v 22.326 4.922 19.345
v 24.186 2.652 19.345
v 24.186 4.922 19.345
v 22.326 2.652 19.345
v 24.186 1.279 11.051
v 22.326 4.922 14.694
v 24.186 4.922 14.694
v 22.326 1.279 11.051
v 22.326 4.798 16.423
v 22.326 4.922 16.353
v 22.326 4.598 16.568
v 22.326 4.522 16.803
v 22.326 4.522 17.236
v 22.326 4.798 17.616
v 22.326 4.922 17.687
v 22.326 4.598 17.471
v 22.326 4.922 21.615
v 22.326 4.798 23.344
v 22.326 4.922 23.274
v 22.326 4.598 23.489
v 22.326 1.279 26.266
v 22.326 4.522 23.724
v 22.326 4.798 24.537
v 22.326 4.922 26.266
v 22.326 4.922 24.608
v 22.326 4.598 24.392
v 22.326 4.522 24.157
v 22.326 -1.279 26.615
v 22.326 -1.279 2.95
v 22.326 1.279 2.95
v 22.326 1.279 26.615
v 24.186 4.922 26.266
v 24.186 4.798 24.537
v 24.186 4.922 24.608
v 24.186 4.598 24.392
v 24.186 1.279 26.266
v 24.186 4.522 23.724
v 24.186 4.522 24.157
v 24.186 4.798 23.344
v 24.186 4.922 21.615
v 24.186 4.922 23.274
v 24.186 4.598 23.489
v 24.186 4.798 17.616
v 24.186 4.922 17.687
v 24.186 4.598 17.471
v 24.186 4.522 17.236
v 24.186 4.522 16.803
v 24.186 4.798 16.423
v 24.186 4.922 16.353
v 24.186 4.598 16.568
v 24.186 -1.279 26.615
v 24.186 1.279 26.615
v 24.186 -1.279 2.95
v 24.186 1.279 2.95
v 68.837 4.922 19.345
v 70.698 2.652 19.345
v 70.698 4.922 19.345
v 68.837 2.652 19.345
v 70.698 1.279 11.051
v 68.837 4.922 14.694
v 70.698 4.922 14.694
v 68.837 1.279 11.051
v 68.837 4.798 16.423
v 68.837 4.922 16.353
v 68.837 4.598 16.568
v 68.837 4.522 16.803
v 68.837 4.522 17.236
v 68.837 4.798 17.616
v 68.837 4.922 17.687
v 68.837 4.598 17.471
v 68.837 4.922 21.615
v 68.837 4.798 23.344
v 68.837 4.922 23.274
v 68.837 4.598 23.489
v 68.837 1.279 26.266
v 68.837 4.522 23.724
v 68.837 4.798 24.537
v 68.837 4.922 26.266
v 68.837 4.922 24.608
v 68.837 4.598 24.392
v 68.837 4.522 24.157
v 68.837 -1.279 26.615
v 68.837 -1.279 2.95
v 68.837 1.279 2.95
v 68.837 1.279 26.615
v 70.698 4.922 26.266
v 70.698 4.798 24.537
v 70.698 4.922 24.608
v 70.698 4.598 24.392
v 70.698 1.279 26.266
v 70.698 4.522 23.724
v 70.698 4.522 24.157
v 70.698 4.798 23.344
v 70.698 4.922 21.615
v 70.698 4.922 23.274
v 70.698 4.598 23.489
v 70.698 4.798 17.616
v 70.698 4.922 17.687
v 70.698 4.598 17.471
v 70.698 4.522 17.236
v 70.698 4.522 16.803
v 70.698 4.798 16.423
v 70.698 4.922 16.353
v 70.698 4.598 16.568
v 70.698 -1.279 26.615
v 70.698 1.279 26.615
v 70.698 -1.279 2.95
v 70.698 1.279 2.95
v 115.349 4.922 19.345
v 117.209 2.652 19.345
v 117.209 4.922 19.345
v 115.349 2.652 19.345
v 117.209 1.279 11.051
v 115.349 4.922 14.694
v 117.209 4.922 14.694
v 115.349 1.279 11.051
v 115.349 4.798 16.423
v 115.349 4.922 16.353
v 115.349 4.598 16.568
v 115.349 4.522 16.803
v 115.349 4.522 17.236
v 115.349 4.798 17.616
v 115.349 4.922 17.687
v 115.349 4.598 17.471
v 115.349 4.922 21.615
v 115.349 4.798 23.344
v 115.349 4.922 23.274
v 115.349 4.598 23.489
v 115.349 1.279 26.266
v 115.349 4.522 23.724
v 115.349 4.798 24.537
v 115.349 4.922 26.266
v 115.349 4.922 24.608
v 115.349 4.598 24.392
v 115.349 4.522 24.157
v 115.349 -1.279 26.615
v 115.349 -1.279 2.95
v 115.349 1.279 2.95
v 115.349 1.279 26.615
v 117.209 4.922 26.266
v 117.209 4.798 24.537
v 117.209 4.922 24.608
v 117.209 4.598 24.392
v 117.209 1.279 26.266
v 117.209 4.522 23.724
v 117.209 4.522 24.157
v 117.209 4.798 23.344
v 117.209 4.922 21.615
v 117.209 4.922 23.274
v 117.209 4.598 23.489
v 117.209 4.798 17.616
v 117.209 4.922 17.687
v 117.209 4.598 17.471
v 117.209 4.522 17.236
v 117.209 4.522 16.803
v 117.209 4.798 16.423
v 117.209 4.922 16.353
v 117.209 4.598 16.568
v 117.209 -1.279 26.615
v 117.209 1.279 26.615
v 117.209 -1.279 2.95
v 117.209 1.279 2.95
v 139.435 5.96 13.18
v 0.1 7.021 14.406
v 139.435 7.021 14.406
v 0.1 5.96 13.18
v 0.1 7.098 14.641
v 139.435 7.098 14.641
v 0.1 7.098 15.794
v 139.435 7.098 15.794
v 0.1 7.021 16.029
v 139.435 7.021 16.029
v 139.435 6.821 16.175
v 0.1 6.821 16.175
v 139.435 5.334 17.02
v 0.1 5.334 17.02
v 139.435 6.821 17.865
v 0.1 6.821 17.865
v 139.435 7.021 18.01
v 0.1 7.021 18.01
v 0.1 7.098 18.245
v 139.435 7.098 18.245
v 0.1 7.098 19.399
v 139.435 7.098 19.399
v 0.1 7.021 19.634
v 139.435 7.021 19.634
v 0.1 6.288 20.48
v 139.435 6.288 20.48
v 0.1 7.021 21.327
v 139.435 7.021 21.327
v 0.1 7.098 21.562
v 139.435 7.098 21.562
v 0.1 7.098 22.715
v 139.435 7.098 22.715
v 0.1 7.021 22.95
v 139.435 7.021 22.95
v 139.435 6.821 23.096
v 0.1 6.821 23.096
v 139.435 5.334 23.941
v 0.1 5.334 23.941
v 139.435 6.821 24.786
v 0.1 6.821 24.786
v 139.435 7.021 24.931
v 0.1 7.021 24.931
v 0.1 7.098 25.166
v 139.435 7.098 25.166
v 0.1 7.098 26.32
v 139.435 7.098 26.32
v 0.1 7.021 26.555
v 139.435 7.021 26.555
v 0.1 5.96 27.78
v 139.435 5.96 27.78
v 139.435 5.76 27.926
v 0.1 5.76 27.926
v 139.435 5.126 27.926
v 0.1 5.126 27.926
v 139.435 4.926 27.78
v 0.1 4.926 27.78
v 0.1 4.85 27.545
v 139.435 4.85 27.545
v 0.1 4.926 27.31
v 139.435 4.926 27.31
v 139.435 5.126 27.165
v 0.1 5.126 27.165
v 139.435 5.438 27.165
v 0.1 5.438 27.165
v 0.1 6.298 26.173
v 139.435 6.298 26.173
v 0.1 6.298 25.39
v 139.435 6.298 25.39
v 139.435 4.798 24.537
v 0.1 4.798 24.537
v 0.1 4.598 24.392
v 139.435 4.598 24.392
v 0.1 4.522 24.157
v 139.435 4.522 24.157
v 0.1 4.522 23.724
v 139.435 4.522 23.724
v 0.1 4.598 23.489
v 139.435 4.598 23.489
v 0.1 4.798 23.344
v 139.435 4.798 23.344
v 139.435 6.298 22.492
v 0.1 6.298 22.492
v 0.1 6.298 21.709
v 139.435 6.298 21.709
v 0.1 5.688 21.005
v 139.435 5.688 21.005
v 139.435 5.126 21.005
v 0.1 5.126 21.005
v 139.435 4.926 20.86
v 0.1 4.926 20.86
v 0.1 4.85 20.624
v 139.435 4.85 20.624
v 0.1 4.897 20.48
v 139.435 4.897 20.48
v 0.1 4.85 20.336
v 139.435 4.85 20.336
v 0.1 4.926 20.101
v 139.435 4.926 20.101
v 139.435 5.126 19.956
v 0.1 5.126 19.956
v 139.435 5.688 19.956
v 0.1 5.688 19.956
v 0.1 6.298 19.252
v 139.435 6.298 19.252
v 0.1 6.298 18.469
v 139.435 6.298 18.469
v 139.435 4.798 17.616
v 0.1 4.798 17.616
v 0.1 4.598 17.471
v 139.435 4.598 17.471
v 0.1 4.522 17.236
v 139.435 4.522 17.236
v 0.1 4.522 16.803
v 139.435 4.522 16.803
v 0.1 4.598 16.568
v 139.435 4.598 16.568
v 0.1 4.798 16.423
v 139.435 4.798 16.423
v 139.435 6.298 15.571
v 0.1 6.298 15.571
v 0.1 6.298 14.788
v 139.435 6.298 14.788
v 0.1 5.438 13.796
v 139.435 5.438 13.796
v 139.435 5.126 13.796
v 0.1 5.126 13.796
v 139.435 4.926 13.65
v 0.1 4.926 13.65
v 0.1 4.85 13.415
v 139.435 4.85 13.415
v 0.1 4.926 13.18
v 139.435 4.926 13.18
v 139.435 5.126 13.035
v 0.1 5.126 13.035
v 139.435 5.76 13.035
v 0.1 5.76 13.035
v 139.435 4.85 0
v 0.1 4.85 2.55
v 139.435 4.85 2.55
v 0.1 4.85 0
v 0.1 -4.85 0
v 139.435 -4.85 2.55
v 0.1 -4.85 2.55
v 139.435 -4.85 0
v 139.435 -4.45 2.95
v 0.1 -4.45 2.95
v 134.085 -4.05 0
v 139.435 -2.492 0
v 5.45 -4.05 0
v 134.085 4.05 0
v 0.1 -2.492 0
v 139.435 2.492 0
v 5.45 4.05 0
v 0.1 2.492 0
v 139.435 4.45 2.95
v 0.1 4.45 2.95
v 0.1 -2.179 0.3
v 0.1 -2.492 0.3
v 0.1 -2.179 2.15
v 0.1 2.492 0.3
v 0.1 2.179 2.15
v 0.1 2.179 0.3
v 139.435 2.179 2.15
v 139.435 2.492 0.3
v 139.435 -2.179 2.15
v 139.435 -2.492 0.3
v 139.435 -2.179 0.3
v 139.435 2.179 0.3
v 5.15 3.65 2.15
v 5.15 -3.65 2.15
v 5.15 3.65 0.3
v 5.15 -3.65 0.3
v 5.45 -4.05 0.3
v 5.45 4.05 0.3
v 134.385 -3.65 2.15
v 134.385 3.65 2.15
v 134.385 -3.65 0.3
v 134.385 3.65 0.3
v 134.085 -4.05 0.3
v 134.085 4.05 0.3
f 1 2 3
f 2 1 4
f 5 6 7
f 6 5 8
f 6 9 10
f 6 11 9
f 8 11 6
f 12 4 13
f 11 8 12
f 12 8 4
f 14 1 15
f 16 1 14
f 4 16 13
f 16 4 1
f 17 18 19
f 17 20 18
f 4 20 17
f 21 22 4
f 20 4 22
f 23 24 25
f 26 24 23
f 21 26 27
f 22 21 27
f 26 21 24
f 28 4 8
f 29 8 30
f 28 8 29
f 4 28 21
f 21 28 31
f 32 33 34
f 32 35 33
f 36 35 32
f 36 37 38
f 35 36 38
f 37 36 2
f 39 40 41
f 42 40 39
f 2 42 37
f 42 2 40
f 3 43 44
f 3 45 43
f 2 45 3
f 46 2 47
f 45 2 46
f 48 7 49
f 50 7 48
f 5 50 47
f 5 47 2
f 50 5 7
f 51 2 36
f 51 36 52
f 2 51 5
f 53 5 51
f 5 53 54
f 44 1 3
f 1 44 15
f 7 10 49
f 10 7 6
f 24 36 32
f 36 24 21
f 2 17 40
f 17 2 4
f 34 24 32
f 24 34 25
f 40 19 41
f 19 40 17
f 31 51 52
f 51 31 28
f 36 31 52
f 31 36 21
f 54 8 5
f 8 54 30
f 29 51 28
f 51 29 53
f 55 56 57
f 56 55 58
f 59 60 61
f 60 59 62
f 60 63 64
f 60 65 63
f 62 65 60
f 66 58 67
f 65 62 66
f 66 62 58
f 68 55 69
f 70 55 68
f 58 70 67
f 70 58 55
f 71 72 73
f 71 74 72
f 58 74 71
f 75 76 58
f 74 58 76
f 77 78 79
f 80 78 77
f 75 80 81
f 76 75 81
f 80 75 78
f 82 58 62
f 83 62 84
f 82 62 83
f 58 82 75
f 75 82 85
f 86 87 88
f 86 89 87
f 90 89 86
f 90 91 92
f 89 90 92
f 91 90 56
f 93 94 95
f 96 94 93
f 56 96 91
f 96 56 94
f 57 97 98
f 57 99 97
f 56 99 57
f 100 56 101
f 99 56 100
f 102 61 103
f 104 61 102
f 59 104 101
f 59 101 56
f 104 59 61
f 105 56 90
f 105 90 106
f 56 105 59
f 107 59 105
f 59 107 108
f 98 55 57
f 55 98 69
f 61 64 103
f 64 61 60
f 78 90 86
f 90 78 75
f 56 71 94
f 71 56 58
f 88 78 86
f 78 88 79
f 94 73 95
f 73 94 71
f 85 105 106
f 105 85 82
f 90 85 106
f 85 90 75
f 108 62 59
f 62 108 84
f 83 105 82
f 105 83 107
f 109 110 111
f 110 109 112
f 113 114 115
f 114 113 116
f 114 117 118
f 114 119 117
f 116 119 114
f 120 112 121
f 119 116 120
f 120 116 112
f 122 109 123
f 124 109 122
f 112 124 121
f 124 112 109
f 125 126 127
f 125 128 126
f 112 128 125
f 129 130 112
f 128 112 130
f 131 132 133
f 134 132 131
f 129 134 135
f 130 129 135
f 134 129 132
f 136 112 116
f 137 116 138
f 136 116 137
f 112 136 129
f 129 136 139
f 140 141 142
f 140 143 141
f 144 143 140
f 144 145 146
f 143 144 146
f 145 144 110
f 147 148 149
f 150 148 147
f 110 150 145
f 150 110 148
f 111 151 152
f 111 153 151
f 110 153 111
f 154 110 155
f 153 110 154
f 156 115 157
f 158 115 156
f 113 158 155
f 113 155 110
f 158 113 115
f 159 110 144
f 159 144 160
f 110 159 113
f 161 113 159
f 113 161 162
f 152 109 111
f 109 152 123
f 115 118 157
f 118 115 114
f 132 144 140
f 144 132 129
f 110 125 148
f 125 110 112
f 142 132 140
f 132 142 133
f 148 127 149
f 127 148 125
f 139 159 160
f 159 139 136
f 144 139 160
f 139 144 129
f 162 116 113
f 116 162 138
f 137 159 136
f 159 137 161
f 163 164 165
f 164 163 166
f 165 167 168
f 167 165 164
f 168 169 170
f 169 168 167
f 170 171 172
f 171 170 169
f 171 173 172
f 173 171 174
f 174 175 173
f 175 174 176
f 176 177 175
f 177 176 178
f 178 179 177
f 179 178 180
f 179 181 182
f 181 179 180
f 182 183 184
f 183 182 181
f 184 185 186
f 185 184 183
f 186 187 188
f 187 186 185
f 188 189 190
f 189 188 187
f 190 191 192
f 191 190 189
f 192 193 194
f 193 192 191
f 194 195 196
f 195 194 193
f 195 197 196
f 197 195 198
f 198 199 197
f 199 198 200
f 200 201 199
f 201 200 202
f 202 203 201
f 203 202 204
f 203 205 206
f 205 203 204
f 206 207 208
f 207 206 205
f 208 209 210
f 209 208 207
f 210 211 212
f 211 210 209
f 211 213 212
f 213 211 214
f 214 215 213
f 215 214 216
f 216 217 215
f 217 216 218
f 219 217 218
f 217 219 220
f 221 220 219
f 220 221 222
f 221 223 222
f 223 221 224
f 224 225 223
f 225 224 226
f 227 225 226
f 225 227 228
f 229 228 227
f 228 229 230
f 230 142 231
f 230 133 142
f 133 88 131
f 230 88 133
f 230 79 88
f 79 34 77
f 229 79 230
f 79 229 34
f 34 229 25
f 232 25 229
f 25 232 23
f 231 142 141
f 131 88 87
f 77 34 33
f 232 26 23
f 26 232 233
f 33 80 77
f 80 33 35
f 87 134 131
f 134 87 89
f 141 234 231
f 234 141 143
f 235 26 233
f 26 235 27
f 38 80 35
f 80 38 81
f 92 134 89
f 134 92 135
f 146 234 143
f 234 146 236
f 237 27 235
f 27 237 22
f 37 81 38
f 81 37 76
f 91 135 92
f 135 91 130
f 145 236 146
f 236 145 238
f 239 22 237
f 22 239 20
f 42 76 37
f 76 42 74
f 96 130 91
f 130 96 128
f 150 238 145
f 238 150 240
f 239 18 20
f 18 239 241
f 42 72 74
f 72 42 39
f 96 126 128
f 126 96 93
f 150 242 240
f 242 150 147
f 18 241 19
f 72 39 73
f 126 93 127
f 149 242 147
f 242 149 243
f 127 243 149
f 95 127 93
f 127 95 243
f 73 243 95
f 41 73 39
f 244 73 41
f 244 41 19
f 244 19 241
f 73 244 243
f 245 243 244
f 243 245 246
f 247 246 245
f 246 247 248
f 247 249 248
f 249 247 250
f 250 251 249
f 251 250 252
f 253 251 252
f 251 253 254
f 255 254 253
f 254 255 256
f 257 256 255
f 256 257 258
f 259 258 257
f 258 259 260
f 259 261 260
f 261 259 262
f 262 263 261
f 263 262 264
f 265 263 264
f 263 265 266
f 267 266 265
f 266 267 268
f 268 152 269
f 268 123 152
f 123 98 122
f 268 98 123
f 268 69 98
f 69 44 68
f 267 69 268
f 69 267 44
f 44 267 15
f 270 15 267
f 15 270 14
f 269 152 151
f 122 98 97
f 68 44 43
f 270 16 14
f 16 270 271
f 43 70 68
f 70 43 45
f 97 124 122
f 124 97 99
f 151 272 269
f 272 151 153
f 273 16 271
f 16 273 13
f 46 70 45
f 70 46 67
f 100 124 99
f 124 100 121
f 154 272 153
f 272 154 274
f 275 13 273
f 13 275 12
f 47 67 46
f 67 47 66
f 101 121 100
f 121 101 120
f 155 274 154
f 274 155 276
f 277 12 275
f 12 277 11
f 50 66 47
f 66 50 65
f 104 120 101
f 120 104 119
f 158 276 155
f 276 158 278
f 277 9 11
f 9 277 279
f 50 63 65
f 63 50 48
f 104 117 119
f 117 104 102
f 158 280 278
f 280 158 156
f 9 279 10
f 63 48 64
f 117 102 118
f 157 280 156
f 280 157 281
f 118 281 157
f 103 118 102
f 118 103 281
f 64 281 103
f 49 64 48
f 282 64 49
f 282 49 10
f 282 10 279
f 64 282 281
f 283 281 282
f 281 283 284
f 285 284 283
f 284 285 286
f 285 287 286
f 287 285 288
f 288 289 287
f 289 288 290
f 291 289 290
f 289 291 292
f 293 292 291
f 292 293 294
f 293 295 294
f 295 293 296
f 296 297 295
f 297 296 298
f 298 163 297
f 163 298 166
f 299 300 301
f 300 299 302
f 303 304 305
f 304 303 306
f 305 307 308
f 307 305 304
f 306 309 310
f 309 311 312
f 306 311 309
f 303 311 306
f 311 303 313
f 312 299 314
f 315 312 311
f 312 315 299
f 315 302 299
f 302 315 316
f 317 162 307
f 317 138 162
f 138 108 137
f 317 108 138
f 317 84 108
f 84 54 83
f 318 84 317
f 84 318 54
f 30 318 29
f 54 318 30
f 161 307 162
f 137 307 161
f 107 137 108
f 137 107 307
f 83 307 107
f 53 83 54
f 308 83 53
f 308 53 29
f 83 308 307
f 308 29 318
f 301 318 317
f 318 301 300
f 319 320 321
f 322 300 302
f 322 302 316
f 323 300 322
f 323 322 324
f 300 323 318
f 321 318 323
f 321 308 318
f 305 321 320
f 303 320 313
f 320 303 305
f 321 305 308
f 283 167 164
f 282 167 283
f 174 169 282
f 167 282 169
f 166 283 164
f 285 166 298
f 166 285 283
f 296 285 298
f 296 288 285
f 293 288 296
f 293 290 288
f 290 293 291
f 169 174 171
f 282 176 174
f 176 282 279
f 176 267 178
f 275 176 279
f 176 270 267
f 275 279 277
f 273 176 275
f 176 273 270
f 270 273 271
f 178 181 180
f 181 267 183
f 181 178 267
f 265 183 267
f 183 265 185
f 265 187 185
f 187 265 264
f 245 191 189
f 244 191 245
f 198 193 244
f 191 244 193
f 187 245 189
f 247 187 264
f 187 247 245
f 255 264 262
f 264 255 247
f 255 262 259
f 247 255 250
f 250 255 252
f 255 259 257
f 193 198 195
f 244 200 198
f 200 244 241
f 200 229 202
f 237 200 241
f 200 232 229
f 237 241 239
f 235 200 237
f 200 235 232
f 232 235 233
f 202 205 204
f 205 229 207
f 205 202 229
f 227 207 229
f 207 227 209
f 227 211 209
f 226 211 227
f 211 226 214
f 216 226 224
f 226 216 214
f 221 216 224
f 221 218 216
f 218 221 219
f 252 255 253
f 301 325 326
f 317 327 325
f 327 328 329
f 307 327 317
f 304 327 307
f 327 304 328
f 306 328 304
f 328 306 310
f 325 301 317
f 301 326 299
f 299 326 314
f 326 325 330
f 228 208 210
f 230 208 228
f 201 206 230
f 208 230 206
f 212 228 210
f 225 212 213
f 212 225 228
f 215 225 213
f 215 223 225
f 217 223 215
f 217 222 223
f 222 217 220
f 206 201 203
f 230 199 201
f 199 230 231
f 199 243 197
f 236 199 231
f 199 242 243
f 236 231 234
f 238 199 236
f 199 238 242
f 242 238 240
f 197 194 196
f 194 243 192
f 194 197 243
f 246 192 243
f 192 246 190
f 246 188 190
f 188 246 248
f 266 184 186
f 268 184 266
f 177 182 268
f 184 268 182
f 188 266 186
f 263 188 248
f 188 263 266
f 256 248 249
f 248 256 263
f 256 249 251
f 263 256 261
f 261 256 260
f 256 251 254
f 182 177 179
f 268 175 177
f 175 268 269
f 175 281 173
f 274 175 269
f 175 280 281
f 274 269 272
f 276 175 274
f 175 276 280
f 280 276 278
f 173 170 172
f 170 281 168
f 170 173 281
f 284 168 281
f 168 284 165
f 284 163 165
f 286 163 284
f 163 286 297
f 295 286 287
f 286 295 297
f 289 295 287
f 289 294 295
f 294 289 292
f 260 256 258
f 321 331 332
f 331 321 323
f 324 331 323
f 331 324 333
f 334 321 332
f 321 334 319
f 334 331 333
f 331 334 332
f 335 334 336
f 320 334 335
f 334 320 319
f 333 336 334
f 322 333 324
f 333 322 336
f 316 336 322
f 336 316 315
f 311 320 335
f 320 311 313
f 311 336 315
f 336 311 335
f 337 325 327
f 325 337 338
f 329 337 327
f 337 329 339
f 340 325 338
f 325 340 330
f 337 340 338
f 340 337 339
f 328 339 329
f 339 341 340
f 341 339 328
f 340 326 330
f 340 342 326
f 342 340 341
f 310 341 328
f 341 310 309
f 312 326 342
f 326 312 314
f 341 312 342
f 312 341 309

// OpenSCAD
// =====================================================================
//  RENNBAHN-DEKO  –  parametrische Bibliothek für den 3D-Druck
//  Maßstäbe 1:10 bis 1:87, einheitliches Stecksystem, Auto-Teilung
//  OpenSCAD >= 2021.01
// =====================================================================
//
//  STECKSYSTEM
//    Alle Streckenteile haben an beiden Enden dieselbe Tasche auf der
//    Unterseite (Mittellinie des Sockels). Verbunden wird mit einem
//    separaten Schwalbenschwanz-Clip ("Verbinder"). Das System ist
//    geschlechtsneutral: jedes Ende passt an jedes Ende, Kurven an
//    Geraden, Leitplanke an Reifenstapel an Betonwand.
//    Die Clipgröße hängt nur vom Maßstab ab -> innerhalb eines Maßstabs
//    passt alles zusammen.
//
//  AUTO-TEILUNG
//    Ist ein Teil länger als das Druckbett, wird es automatisch in
//    gleich lange Segmente geteilt. Exportiert wird EIN Segment, die
//    Konsole sagt, wie oft es zu drucken ist.
//
//  MEHRFARBDRUCK
//    farbteil = A / B / sockel exportiert die Farbbereiche einzeln
//    (gleiche Koordinaten) – im Slicer als ein Objekt mit mehreren
//    Teilen laden (AMS/MMU). "alle" = einfarbiges Teil.
//
//  DRUCK
//    Alle Teile werden so exportiert, wie sie gedruckt werden
//    (Sockel unten). Clips flach drucken. Magnete optional (Kleber).
// =====================================================================

/* [Maßstab] */
// Maßstab 1/x
massstab = 43; // [10:1/10 RC-Car, 18:1/18 Modellauto, 24:1/24 Slotcar, 28:1/28 Mini-RC, 32:1/32 Slotcar, 43:1/43 Drift-RC und Slotcar, 64:1/64 Diecast, 87:1/87 H0, 0:eigener Maßstab]
// nur bei "eigener Maßstab"
eigener_massstab = 50;

/* [Produkt] */
produkt = "leitplanke"; // [leitplanke:Leitplanke, reifenstapel:Reifenstapel, betonwand:Betonleitwand, curb:Curb, pylone:Pylonen, verbinder:Verbinder-Clips, schaufenster:Schaufenster-Szene]
form = "gerade"; // [gerade:Gerade, kurve:Kurve]
// Gesamtlänge Gerade in Modell-mm (0 = 12 m Vorbild)
laenge_mm = 0;
// Kurvenradius der Mittellinie in Modell-mm (0 = 10 m Vorbild)
radius_mm = 0;
// Kurvenwinkel
winkel = 90; // [5:180]
// Fahrbahnseite (links = Kurveninnenseite)
zur_strecke = "links"; // [links, rechts]
ansicht = "druck"; // [druck:Druckteil (1 Segment), aufbau:Aufbau gesamt]
farbteil = "alle"; // [alle:Alles einfarbig, A:Farbe A, B:Farbe B, sockel:Sockel]

/* [Leitplanke] */
// Anzahl übereinander liegender Planken
planken = 2; // [1:3]
// Pfostenabstand Vorbild (m)
pfostenabstand_m = 2.0;

/* [Reifenstapel] */
reifen_hoch = 4;  // [1:8]
reifen_reihen = 1; // [1:3]
// Farbmuster (A/B)
reifen_muster = "ringe"; // [einfarbig, ringe:abwechselnd je Lage, stapel:abwechselnd je Stapel]
// Förderband-Verkleidung zur Fahrbahn
foerderband = false;

/* [Betonleitwand] */
// Elementlänge Vorbild (m)
element_m = 3.0;
beton_muster = "abwechselnd"; // [einfarbig, abwechselnd:rot-weiß je Element]
details = true;

/* [Curb] */
curb_breite_m = 1.0;
curb_streifen_m = 1.0;
// mit Verbinder-Tasche (sonst flach, zum Aufkleben)
curb_verbinder = true;

/* [Pylonen & Clips] */
pylonen_anzahl = 12;
verbinder_anzahl = 10;

/* [Druck & Passung] */
// Druckbett-Kante (mm)
druckbett = 200;
// Randabstand auf dem Bett (mm)
rand = 5;
min_wand = 1.2;
// Spiel der Verbinder (mm), bei strammem Sitz erhöhen
spiel = 0.15;
magnete = false;
magnet_d = 6;
magnet_h = 2;

// =====================================================================
//  Grundlagen
// =====================================================================
$fa = 2; $fs = 0.3;
e   = 0.01;
den = massstab == 0 ? eigener_massstab : massstab;
s   = 1 / den;
function sc(mm, mn = 0) = max(mm * s, mn);
function r2(x) = round(x * 100) / 100;
usable = druckbett - 2 * rand;
gap = 0.1;                       // Luft je Stoßfläche

// Verbinder-Klassen: [Länge, Taille, Breite, Höhe]
function conn_tab(d) =
    d <= 12 ? [20, 7, 12, 4] :
    d <= 20 ? [16, 6, 10, 3.2] :
    d <= 26 ? [14, 5, 9, 3] :
    d <= 36 ? [12, 4.5, 8, 2.5] :
    d <= 50 ? [10, 4, 7, 2] :
              [8, 3.2, 5.6, 1.6];
CT  = conn_tab(den);
cL  = CT[0]; cw0 = CT[1]; cw1 = CT[2]; ch = CT[3];
deck = 0.8;                      // Material über der Tasche
base_h = max(ch + spiel + deck, magnete ? magnet_h + 0.2 + deck : 0);
sockel_min = cw1 + 2 * (spiel + min_wand);

// Pfad-Kontext (dynamisch, damit die Szene Gerade und Kurve mischen kann)
$kurve = form == "kurve";
$R  = radius_mm > 0 ? radius_mm : sc(10000);
$sd = zur_strecke == "links" ? 1 : -1;

function adeg(sv) = sv / $R * 180 / PI;
function inc(fp, g) = fp == "alle" || fp == g;
function units(Ls, U) = max(1, round(Ls / U));

// Platzieren an Bogenlänge sv, seitlich u (lokal: x = Fahrtrichtung, y = links)
module at(sv, u = 0) {
    if ($kurve) rotate([0, 0, adeg(sv)]) translate([$R - u, 0, 0]) rotate([0, 0, 90]) children();
    else translate([sv, u, 0]) children();
}
// 2D-Profil (u, z) entlang des Pfades von s0 bis s1 extrudieren
module path_extrude(s0, s1) {
    if (s1 > s0) {
        if ($kurve)
            rotate([0, 0, adeg(s0)]) rotate_extrude(angle = adeg(s1 - s0))
                translate([$R, 0]) mirror([1, 0]) children();
        else
            translate([s0, 0, 0]) rotate([90, 0, 90]) linear_extrude(s1 - s0) children();
    }
}
module side2() { if ($sd < 0) mirror([1, 0]) children(); else children(); }
module side3() { if ($sd < 0) mirror([0, 1, 0]) children(); else children(); }
module place_seg(s0) {
    if ($kurve) rotate([0, 0, adeg(s0)]) children(); else translate([s0, 0, 0]) children();
}

// Passt ein Segment der Länge Ls (Halbbreite hw) aufs Bett?
function fits(Ls, hw) = $kurve
    ? let(a = adeg(Ls), Ri = $R - hw, Ro = $R + hw)
      a <= 180 && 2 * Ro * sin(a / 2) <= usable && Ro - Ri * cos(a / 2) <= usable
    : Ls <= usable && 2 * hw <= usable;
function seg_n(L, hw, n = 1) = (fits(L / n, hw) || n > 60) ? n : seg_n(L, hw, n + 1);

// =====================================================================
//  Stecksystem
// =====================================================================
module slot_2d() {
    w0 = cw0 / 2 + spiel; w1 = cw1 / 2 + spiel; l = cL / 2 + spiel;
    polygon([[-1, -w0], [0, -w0], [l, -w1], [l, w1], [0, w0], [-1, w0]]);
}
module slot() {
    translate([0, 0, -e]) linear_extrude(ch + spiel + e) slot_2d();
    translate([0, 0, -e]) linear_extrude(0.3 + e) offset(delta = 0.3) slot_2d(); // Elefantenfuß
}
module clip() {
    linear_extrude(ch) polygon([[-cL / 2, -cw1 / 2], [0, -cw0 / 2], [cL / 2, -cw1 / 2],
                                [cL / 2, cw1 / 2], [0, cw0 / 2], [-cL / 2, cw1 / 2]]);
}
module conn_pockets(Ls, u = 0) { at(0, u) slot(); at(Ls, u) rotate([0, 0, 180]) slot(); }
module magnet_pockets(Ls, u = 0) {
    if (magnete) {
        k = max(1, floor(Ls / 60));
        keep = cL / 2 + spiel + 0.8 + magnet_d / 2;
        for (i = [0 : k - 1]) {
            sm = (i + 0.5) * Ls / k;
            if (sm >= keep && Ls - sm >= keep)
                at(sm, u) translate([0, 0, -e]) cylinder(d = magnet_d + 0.2, h = magnet_h + 0.2 + e, $fn = 32);
        }
    }
}
module sockel_2d(w) {
    f = min(0.4, base_h / 4);
    polygon([[-w / 2, 0], [w / 2, 0], [w / 2, base_h - f], [w / 2 - f, base_h],
             [-w / 2 + f, base_h], [-w / 2, base_h - f]]);
}
module seg_volume(Ls) {
    umax = $kurve ? min(500, $R - 0.05) : 500;
    path_extrude(gap, Ls - gap) translate([-500, -1]) square([500 + umax, 1000]);
}
// Segment beschneiden, Taschen und Magnetlöcher einbringen
module seg_wrap(Ls, uc = 0, conn = true) {
    difference() {
        intersection() { children(); seg_volume(Ls); }
        if (conn) { conn_pockets(Ls, uc); magnet_pockets(Ls, uc); }
    }
}

// =====================================================================
//  LEITPLANKE (Schutzplanke, A-Profil)
// =====================================================================
gr_H     = sc(310, 2.4);
gr_D     = sc(83, 0.8);
gr_t     = sc(4, 0.8);
gr_z0    = base_h + sc(450, 1.5);
gr_pitch = gr_H * 0.96;
gr_top   = gr_z0 + gr_pitch * (planken - 1) + gr_H;
post_s   = sc(80, 1.2);
post_u   = sc(110, 1.4);
gr_ub    = post_u / 2 + sc(150, 0.6);
gr_front = gr_ub + gr_D + gr_t / 2;
gr_sw    = sockel_min;
gr_hw    = max(gr_sw / 2, gr_front);
gr_bh    = sc(200, 1.5);

W_PTS = [[0.25, 0], [0.45, 0], [1, 0.17], [1, 0.33], [0.08, 0.47], [0.08, 0.53],
         [1, 0.67], [1, 0.83], [0.45, 1], [0.25, 1]];

module w_profile(z0) {
    p = [for (q = W_PTS) [gr_ub + q[0] * gr_D, z0 + q[1] * gr_H]];
    for (i = [0 : len(p) - 2])
        hull() { translate(p[i]) circle(d = gr_t, $fn = 10); translate(p[i + 1]) circle(d = gr_t, $fn = 10); }
}

module leitplanke_body(Ls) {
    n = units(Ls, sc(pfostenabstand_m * 1000));
    sp = Ls / n;
    bo_end = gr_ub + 0.08 * gr_D;
    bo_len = bo_end - post_u / 2;
    for (i = [0 : n - 1]) at((i + 0.5) * sp) {
        translate([-post_s / 2, -post_u / 2, base_h - e])
            cube([post_s, post_u, gr_top - sc(40) - base_h + e]);
        side3() for (k = [0 : planken - 1]) {
            zc = gr_z0 + k * gr_pitch + gr_H / 2;
            // Distanzstück mit 45°-Unterseite (stützfrei druckbar)
            hull() {
                translate([-post_s / 2, post_u / 2 - e, zc - gr_bh / 2]) cube([post_s, bo_len + e, gr_bh]);
                translate([-post_s / 2, post_u / 2 - e, zc - gr_bh / 2 - bo_len]) cube([post_s, e, gr_bh]);
            }
        }
    }
    path_extrude(0, Ls) side2() for (k = [0 : planken - 1]) w_profile(gr_z0 + k * gr_pitch);
}

module leitplanke_seg(Ls, fp) {
    seg_wrap(Ls) union() {
        if (inc(fp, "sockel")) path_extrude(0, Ls) sockel_2d(gr_sw);
        if (inc(fp, "A")) leitplanke_body(Ls);
    }
}

// =====================================================================
//  REIFENSTAPEL
// =====================================================================
t_OD   = sc(620, 4);
t_W    = sc(200, 1.0);
t_ID   = min(sc(380), t_OD - 2 * min_wand);
t_ru   = t_OD * 0.97;                         // Reihenabstand
t_span = (reifen_reihen - 1) * t_ru + t_OD;
t_band = sc(15, 0.8);
t_sw   = max(sockel_min, t_span);
t_hw   = t_span / 2 + (foerderband ? t_band + 0.2 : 0) + t_OD * 0.02;

module tire(D) {
    w = (D - t_ID) / 2;
    r = min(t_W, w) * 0.35;
    rotate_extrude($fn = 36) translate([t_ID / 2 + r, r])
        offset(r = r, $fn = 12) square([w - 2 * r, t_W - 2 * r]);
}

module reifen_body(Ls, g) {
    n = units(Ls, t_OD);
    p = Ls / n;
    D = max(t_OD, p) * 1.03;
    for (i = [0 : n - 1], j = [0 : reifen_reihen - 1], k = [0 : reifen_hoch - 1]) {
        c = reifen_muster == "ringe" ? k % 2 : reifen_muster == "stapel" ? (i + j) % 2 : 0;
        if ((g == "A" && c == 0) || (g == "B" && c == 1))
            at((i + 0.5) * p, (j - (reifen_reihen - 1) / 2) * t_ru)
                translate([0, 0, base_h - e + k * t_W * 0.96]) tire(D);
    }
    if (foerderband && g == "A") {
        u0 = (reifen_reihen - 1) / 2 * t_ru + D / 2 - 0.15;
        path_extrude(0, Ls) side2() translate([u0, base_h - e])
            square([t_band, (reifen_hoch - 1) * t_W * 0.96 + t_W]);
    }
}

module reifen_seg(Ls, fp) {
    seg_wrap(Ls) union() {
        if (inc(fp, "sockel")) path_extrude(0, Ls) sockel_2d(t_sw);
        if (inc(fp, "A")) reifen_body(Ls, "A");
        if (inc(fp, "B")) reifen_body(Ls, "B");
    }
}

// =====================================================================
//  BETONLEITWAND (New-Jersey-Profil)
// =====================================================================
j_hb = sc(305, 2.0); j_z1 = sc(75, 0.3);
j_h2 = sc(126, 1.2); j_z2 = sc(330, 1.5);
j_h3 = sc(75, 0.8);  j_z3 = sc(813, 5.0);
j_sw = max(sockel_min, 2 * j_hb + 2 * sc(40, 0.4));
j_hw = j_sw / 2;

module jersey_2d() {
    polygon([[-j_hb, 0], [j_hb, 0], [j_hb, j_z1], [j_h2, j_z2], [j_h3, j_z3],
             [-j_h3, j_z3], [-j_h2, j_z2], [-j_hb, j_z1]]);
}

module beton_body(Ls, g) {
    n  = units(Ls, sc(element_m * 1000));
    el = Ls / n;
    gw = sc(25, 0.4); gd = sc(25, 0.3);
    difference() {
        union() for (i = [0 : n - 1]) {
            c = beton_muster == "abwechselnd" ? i % 2 : 0;
            if ((g == "A" && c == 0) || (g == "B" && c == 1))
                path_extrude(i * el, (i + 1) * el) translate([0, base_h - e]) jersey_2d();
        }
        // Fugen zwischen den Elementen (an den Segmentenden halbe Fuge)
        for (i = [0 : n])
            path_extrude(i * el - gw / 2, i * el + gw / 2) translate([0, base_h]) difference() {
                offset(delta = 0.01) jersey_2d();
                offset(delta = -gd) jersey_2d();
                translate([-j_hb, -1]) square([2 * j_hb, gd + 1.01]);
            }
        // Ablauf-/Staplerschlitz unten
        if (details)
            for (i = [0 : n - 1]) at((i + 0.5) * el)
                translate([-sc(300, 1.2) / 2, -j_hb - 1, base_h - e])
                    cube([sc(300, 1.2), 2 * j_hb + 2, sc(100, 0.6) + e]);
    }
}

module beton_seg(Ls, fp) {
    seg_wrap(Ls) union() {
        if (inc(fp, "sockel")) path_extrude(0, Ls) sockel_2d(j_sw);
        if (inc(fp, "A")) beton_body(Ls, "A");
        if (inc(fp, "B")) beton_body(Ls, "B");
    }
}

// =====================================================================
//  CURB (Randstein, rot-weiß)
// =====================================================================
cb_h  = curb_verbinder ? base_h : sc(80, 1.0);
cb_W  = max(sc(curb_breite_m * 1000), curb_verbinder ? sockel_min / 0.55 : 4);
cb_uc = -0.2 * cb_W;                          // Taschenposition (flacher Teil)

module curb_2d() {
    f  = min(0.3, cb_h / 4);
    lo = min(0.4, cb_h / 3);
    polygon([[-cb_W / 2, 0], [cb_W / 2, 0], [cb_W / 2, lo], [cb_W / 2 - 0.4 * cb_W, cb_h],
             [-cb_W / 2 + f, cb_h], [-cb_W / 2, cb_h - f]]);
}

module curb_body(Ls, g) {
    n  = 2 * units(Ls, 2 * sc(curb_streifen_m * 1000));
    st = Ls / n;
    for (i = [0 : n - 1])
        if ((g == "A" && i % 2 == 0) || (g == "B" && i % 2 == 1))
            path_extrude(i * st, (i + 1) * st) side2() curb_2d();
}

module curb_seg(Ls, fp) {
    seg_wrap(Ls, cb_uc * $sd, curb_verbinder) union() {
        if (inc(fp, "A")) curb_body(Ls, "A");
        if (inc(fp, "B")) curb_body(Ls, "B");
    }
}

// =====================================================================
//  PYLONE (Leitkegel 500 mm)
// =====================================================================
p_H  = sc(500, 6);
p_ba = sc(380, 4);
p_bt = sc(30, 0.6);
p_rb = sc(140, 1.5);
p_rt = sc(20, 0.4);
p_mag = magnete && magnet_d + 1.2 <= 2 * p_rb;

module pylone_body() {
    linear_extrude(p_bt) offset(r = p_ba * 0.12) square(p_ba * 0.76, center = true);
    cylinder(h = p_H - p_rt, r1 = p_rb, r2 = p_rt);
    translate([0, 0, p_H - p_rt]) sphere(r = p_rt);
}
module pylone_baender() {
    for (b = [[0.30, 0.42], [0.55, 0.65]])
        translate([0, 0, b[0] * p_H]) cylinder(h = (b[1] - b[0]) * p_H, r = p_ba);
}
module pylone(fp) {
    difference() {
        union() {
            if (fp == "alle") pylone_body();
            if (fp == "A") difference() { pylone_body(); pylone_baender(); }
            if (fp == "B") intersection() { pylone_body(); pylone_baender(); }
        }
        if (p_mag) translate([0, 0, -e]) cylinder(d = magnet_d + 0.2, h = magnet_h + 0.2 + e, $fn = 32);
    }
}
module pylone_vorschau() {
    color(col("pylone", "A")) pylone_body();
    color(col("pylone", "B")) intersection() { scale([1.03, 1.03, 1]) pylone_body(); pylone_baender(); }
}
module pylonen_platte(fp) {
    nx = ceil(sqrt(pylonen_anzahl));
    d  = p_ba + 3;
    for (i = [0 : pylonen_anzahl - 1])
        translate([(i % nx) * d, floor(i / nx) * d, 0]) pylone(fp);
}

module verbinder_platte() {
    nx = ceil(sqrt(verbinder_anzahl));
    for (i = [0 : verbinder_anzahl - 1])
        translate([(i % nx) * (cL + 3), floor(i / nx) * (cw1 + 3), 0]) clip();
}

// =====================================================================
//  Dispatcher, Farben, Ansichten
// =====================================================================
function hw_of(p) = p == "leitplanke" ? gr_hw : p == "reifenstapel" ? t_hw :
                    p == "betonwand" ? j_hw : p == "curb" ? cb_W / 2 : 10;
function col(p, fp) =
    fp == "sockel" ? "#5f6368" :
    p == "leitplanke"   ? "#c9ced3" :
    p == "reifenstapel" ? (fp == "A" ? "#262626" : "#e9e9e9") :
    p == "betonwand"    ? (fp == "A" ? "#ebe8e1" : "#c0392b") :
    p == "curb"         ? (fp == "A" ? "#c0392b" : "#f2f2f2") :
    p == "pylone"       ? (fp == "A" ? "#ff6a13" : "#f5f5f5") : "#8a8a8a";

module seg(p, Ls, fp) {
    if      (p == "leitplanke")   leitplanke_seg(Ls, fp);
    else if (p == "reifenstapel") reifen_seg(Ls, fp);
    else if (p == "betonwand")    beton_seg(Ls, fp);
    else if (p == "curb")         curb_seg(Ls, fp);
}
module seg_color(p, Ls) {
    for (fp = ["sockel", "A", "B"]) color(col(p, fp)) seg(p, Ls, fp);
}
// Komplette Strecke aus n Segmenten
module strecke(p, L, n = 0) {
    N  = n > 0 ? n : seg_n(L, hw_of(p));
    Ls = L / N;
    for (i = [0 : N - 1]) place_seg(i * Ls) seg_color(p, Ls);
}
module print_pose(Ls, hw) {
    if ($kurve) {
        a = adeg(Ls);
        translate([0, -($R - hw) * cos(a / 2), 0]) rotate([0, 0, 90 - a / 2]) children();
    } else children();
}

// ---------------------------------------------------------------------
//  Schaufenster: alle Produkte zusammen (für Produktbilder)
// ---------------------------------------------------------------------
module schaufenster() {
    L  = sc(12000);
    Rk = sc(9000);
    Lt = sc(4400);
    // Reifenwand  ->  Leitplanke gerade  ->  Leitplanke Kurve (per Clip verbunden)
    translate([-Lt, 0, 0]) strecke("reifenstapel", Lt, 1, $kurve = false, $sd = 1);
    strecke("leitplanke", L, 1, $kurve = false, $sd = 1);
    translate([L, Rk, 0]) rotate([0, 0, -90])
        strecke("leitplanke", Rk * PI / 2, 2, $kurve = true, $R = Rk, $sd = 1);
    // Curb an der Fahrbahnkante
    translate([0, sc(1800), 0]) strecke("curb", L, 1, $kurve = false, $sd = 1);
    // Pylonen-Slalom auf der Fahrbahn
    for (i = [0 : 4]) translate([sc(1500) + i * sc(2200), sc(4800) + (i % 2) * sc(1400), 0])
        pylone_vorschau();
    // Betonwand gegenüber
    translate([0, sc(9500), 0]) strecke("betonwand", L, 1, $kurve = false, $sd = -1);
    // Clips als Beigabe
    translate([-Lt, sc(5000), 0]) for (i = [0 : 2]) translate([i * (cL + 3), 0, 0]) color("#444") clip();
}

// =====================================================================
//  Ausgabe
// =====================================================================
is_strecke = produkt == "leitplanke" || produkt == "reifenstapel" ||
             produkt == "betonwand" || produkt == "curb";
TOTAL = $kurve ? $R * winkel * PI / 180 : (laenge_mm > 0 ? laenge_mm : sc(12000));
HW = hw_of(produkt);
N  = seg_n(TOTAL, HW);
LS = TOTAL / N;

echo(str("Maßstab 1:", den, " | Sockelhöhe ", r2(base_h), " mm | Verbinder L×B×H ",
         cL, "×", cw1, "×", ch, " mm"));
if (is_strecke) {
    echo(str(produkt, " ", form, ": ", N, " Segment(e) à ", r2(LS), " mm",
             $kurve ? str(" / ", r2(adeg(LS)), "°") : "", "  ->  ", N, "x drucken, ",
             max(0, N - 1), " Verbinder für die Stöße"));
    if ($kurve && $R <= HW + 1) echo("FEHLER: Radius zu klein für dieses Produkt!");
    if (!fits(LS, HW)) echo("WARNUNG: Segment passt nicht aufs Druckbett – Radius/Bett prüfen.");
}
if (produkt == "pylone" && magnete && !p_mag)
    echo("Hinweis: Pylone in diesem Maßstab zu schmal für den Magneten – ohne Magnet erzeugt.");

if (produkt == "schaufenster") schaufenster();
else if (produkt == "verbinder") verbinder_platte();
else if (produkt == "pylone") {
    if (ansicht == "aufbau") {
        nx = ceil(sqrt(pylonen_anzahl));
        for (i = [0 : pylonen_anzahl - 1])
            translate([(i % nx) * (p_ba + 3), floor(i / nx) * (p_ba + 3), 0]) pylone_vorschau();
    }
    else pylonen_platte(farbteil);
}
else if (is_strecke) {
    if (ansicht == "aufbau") strecke(produkt, TOTAL, N);
    else print_pose(LS, HW) seg(produkt, LS, farbteil);
}
